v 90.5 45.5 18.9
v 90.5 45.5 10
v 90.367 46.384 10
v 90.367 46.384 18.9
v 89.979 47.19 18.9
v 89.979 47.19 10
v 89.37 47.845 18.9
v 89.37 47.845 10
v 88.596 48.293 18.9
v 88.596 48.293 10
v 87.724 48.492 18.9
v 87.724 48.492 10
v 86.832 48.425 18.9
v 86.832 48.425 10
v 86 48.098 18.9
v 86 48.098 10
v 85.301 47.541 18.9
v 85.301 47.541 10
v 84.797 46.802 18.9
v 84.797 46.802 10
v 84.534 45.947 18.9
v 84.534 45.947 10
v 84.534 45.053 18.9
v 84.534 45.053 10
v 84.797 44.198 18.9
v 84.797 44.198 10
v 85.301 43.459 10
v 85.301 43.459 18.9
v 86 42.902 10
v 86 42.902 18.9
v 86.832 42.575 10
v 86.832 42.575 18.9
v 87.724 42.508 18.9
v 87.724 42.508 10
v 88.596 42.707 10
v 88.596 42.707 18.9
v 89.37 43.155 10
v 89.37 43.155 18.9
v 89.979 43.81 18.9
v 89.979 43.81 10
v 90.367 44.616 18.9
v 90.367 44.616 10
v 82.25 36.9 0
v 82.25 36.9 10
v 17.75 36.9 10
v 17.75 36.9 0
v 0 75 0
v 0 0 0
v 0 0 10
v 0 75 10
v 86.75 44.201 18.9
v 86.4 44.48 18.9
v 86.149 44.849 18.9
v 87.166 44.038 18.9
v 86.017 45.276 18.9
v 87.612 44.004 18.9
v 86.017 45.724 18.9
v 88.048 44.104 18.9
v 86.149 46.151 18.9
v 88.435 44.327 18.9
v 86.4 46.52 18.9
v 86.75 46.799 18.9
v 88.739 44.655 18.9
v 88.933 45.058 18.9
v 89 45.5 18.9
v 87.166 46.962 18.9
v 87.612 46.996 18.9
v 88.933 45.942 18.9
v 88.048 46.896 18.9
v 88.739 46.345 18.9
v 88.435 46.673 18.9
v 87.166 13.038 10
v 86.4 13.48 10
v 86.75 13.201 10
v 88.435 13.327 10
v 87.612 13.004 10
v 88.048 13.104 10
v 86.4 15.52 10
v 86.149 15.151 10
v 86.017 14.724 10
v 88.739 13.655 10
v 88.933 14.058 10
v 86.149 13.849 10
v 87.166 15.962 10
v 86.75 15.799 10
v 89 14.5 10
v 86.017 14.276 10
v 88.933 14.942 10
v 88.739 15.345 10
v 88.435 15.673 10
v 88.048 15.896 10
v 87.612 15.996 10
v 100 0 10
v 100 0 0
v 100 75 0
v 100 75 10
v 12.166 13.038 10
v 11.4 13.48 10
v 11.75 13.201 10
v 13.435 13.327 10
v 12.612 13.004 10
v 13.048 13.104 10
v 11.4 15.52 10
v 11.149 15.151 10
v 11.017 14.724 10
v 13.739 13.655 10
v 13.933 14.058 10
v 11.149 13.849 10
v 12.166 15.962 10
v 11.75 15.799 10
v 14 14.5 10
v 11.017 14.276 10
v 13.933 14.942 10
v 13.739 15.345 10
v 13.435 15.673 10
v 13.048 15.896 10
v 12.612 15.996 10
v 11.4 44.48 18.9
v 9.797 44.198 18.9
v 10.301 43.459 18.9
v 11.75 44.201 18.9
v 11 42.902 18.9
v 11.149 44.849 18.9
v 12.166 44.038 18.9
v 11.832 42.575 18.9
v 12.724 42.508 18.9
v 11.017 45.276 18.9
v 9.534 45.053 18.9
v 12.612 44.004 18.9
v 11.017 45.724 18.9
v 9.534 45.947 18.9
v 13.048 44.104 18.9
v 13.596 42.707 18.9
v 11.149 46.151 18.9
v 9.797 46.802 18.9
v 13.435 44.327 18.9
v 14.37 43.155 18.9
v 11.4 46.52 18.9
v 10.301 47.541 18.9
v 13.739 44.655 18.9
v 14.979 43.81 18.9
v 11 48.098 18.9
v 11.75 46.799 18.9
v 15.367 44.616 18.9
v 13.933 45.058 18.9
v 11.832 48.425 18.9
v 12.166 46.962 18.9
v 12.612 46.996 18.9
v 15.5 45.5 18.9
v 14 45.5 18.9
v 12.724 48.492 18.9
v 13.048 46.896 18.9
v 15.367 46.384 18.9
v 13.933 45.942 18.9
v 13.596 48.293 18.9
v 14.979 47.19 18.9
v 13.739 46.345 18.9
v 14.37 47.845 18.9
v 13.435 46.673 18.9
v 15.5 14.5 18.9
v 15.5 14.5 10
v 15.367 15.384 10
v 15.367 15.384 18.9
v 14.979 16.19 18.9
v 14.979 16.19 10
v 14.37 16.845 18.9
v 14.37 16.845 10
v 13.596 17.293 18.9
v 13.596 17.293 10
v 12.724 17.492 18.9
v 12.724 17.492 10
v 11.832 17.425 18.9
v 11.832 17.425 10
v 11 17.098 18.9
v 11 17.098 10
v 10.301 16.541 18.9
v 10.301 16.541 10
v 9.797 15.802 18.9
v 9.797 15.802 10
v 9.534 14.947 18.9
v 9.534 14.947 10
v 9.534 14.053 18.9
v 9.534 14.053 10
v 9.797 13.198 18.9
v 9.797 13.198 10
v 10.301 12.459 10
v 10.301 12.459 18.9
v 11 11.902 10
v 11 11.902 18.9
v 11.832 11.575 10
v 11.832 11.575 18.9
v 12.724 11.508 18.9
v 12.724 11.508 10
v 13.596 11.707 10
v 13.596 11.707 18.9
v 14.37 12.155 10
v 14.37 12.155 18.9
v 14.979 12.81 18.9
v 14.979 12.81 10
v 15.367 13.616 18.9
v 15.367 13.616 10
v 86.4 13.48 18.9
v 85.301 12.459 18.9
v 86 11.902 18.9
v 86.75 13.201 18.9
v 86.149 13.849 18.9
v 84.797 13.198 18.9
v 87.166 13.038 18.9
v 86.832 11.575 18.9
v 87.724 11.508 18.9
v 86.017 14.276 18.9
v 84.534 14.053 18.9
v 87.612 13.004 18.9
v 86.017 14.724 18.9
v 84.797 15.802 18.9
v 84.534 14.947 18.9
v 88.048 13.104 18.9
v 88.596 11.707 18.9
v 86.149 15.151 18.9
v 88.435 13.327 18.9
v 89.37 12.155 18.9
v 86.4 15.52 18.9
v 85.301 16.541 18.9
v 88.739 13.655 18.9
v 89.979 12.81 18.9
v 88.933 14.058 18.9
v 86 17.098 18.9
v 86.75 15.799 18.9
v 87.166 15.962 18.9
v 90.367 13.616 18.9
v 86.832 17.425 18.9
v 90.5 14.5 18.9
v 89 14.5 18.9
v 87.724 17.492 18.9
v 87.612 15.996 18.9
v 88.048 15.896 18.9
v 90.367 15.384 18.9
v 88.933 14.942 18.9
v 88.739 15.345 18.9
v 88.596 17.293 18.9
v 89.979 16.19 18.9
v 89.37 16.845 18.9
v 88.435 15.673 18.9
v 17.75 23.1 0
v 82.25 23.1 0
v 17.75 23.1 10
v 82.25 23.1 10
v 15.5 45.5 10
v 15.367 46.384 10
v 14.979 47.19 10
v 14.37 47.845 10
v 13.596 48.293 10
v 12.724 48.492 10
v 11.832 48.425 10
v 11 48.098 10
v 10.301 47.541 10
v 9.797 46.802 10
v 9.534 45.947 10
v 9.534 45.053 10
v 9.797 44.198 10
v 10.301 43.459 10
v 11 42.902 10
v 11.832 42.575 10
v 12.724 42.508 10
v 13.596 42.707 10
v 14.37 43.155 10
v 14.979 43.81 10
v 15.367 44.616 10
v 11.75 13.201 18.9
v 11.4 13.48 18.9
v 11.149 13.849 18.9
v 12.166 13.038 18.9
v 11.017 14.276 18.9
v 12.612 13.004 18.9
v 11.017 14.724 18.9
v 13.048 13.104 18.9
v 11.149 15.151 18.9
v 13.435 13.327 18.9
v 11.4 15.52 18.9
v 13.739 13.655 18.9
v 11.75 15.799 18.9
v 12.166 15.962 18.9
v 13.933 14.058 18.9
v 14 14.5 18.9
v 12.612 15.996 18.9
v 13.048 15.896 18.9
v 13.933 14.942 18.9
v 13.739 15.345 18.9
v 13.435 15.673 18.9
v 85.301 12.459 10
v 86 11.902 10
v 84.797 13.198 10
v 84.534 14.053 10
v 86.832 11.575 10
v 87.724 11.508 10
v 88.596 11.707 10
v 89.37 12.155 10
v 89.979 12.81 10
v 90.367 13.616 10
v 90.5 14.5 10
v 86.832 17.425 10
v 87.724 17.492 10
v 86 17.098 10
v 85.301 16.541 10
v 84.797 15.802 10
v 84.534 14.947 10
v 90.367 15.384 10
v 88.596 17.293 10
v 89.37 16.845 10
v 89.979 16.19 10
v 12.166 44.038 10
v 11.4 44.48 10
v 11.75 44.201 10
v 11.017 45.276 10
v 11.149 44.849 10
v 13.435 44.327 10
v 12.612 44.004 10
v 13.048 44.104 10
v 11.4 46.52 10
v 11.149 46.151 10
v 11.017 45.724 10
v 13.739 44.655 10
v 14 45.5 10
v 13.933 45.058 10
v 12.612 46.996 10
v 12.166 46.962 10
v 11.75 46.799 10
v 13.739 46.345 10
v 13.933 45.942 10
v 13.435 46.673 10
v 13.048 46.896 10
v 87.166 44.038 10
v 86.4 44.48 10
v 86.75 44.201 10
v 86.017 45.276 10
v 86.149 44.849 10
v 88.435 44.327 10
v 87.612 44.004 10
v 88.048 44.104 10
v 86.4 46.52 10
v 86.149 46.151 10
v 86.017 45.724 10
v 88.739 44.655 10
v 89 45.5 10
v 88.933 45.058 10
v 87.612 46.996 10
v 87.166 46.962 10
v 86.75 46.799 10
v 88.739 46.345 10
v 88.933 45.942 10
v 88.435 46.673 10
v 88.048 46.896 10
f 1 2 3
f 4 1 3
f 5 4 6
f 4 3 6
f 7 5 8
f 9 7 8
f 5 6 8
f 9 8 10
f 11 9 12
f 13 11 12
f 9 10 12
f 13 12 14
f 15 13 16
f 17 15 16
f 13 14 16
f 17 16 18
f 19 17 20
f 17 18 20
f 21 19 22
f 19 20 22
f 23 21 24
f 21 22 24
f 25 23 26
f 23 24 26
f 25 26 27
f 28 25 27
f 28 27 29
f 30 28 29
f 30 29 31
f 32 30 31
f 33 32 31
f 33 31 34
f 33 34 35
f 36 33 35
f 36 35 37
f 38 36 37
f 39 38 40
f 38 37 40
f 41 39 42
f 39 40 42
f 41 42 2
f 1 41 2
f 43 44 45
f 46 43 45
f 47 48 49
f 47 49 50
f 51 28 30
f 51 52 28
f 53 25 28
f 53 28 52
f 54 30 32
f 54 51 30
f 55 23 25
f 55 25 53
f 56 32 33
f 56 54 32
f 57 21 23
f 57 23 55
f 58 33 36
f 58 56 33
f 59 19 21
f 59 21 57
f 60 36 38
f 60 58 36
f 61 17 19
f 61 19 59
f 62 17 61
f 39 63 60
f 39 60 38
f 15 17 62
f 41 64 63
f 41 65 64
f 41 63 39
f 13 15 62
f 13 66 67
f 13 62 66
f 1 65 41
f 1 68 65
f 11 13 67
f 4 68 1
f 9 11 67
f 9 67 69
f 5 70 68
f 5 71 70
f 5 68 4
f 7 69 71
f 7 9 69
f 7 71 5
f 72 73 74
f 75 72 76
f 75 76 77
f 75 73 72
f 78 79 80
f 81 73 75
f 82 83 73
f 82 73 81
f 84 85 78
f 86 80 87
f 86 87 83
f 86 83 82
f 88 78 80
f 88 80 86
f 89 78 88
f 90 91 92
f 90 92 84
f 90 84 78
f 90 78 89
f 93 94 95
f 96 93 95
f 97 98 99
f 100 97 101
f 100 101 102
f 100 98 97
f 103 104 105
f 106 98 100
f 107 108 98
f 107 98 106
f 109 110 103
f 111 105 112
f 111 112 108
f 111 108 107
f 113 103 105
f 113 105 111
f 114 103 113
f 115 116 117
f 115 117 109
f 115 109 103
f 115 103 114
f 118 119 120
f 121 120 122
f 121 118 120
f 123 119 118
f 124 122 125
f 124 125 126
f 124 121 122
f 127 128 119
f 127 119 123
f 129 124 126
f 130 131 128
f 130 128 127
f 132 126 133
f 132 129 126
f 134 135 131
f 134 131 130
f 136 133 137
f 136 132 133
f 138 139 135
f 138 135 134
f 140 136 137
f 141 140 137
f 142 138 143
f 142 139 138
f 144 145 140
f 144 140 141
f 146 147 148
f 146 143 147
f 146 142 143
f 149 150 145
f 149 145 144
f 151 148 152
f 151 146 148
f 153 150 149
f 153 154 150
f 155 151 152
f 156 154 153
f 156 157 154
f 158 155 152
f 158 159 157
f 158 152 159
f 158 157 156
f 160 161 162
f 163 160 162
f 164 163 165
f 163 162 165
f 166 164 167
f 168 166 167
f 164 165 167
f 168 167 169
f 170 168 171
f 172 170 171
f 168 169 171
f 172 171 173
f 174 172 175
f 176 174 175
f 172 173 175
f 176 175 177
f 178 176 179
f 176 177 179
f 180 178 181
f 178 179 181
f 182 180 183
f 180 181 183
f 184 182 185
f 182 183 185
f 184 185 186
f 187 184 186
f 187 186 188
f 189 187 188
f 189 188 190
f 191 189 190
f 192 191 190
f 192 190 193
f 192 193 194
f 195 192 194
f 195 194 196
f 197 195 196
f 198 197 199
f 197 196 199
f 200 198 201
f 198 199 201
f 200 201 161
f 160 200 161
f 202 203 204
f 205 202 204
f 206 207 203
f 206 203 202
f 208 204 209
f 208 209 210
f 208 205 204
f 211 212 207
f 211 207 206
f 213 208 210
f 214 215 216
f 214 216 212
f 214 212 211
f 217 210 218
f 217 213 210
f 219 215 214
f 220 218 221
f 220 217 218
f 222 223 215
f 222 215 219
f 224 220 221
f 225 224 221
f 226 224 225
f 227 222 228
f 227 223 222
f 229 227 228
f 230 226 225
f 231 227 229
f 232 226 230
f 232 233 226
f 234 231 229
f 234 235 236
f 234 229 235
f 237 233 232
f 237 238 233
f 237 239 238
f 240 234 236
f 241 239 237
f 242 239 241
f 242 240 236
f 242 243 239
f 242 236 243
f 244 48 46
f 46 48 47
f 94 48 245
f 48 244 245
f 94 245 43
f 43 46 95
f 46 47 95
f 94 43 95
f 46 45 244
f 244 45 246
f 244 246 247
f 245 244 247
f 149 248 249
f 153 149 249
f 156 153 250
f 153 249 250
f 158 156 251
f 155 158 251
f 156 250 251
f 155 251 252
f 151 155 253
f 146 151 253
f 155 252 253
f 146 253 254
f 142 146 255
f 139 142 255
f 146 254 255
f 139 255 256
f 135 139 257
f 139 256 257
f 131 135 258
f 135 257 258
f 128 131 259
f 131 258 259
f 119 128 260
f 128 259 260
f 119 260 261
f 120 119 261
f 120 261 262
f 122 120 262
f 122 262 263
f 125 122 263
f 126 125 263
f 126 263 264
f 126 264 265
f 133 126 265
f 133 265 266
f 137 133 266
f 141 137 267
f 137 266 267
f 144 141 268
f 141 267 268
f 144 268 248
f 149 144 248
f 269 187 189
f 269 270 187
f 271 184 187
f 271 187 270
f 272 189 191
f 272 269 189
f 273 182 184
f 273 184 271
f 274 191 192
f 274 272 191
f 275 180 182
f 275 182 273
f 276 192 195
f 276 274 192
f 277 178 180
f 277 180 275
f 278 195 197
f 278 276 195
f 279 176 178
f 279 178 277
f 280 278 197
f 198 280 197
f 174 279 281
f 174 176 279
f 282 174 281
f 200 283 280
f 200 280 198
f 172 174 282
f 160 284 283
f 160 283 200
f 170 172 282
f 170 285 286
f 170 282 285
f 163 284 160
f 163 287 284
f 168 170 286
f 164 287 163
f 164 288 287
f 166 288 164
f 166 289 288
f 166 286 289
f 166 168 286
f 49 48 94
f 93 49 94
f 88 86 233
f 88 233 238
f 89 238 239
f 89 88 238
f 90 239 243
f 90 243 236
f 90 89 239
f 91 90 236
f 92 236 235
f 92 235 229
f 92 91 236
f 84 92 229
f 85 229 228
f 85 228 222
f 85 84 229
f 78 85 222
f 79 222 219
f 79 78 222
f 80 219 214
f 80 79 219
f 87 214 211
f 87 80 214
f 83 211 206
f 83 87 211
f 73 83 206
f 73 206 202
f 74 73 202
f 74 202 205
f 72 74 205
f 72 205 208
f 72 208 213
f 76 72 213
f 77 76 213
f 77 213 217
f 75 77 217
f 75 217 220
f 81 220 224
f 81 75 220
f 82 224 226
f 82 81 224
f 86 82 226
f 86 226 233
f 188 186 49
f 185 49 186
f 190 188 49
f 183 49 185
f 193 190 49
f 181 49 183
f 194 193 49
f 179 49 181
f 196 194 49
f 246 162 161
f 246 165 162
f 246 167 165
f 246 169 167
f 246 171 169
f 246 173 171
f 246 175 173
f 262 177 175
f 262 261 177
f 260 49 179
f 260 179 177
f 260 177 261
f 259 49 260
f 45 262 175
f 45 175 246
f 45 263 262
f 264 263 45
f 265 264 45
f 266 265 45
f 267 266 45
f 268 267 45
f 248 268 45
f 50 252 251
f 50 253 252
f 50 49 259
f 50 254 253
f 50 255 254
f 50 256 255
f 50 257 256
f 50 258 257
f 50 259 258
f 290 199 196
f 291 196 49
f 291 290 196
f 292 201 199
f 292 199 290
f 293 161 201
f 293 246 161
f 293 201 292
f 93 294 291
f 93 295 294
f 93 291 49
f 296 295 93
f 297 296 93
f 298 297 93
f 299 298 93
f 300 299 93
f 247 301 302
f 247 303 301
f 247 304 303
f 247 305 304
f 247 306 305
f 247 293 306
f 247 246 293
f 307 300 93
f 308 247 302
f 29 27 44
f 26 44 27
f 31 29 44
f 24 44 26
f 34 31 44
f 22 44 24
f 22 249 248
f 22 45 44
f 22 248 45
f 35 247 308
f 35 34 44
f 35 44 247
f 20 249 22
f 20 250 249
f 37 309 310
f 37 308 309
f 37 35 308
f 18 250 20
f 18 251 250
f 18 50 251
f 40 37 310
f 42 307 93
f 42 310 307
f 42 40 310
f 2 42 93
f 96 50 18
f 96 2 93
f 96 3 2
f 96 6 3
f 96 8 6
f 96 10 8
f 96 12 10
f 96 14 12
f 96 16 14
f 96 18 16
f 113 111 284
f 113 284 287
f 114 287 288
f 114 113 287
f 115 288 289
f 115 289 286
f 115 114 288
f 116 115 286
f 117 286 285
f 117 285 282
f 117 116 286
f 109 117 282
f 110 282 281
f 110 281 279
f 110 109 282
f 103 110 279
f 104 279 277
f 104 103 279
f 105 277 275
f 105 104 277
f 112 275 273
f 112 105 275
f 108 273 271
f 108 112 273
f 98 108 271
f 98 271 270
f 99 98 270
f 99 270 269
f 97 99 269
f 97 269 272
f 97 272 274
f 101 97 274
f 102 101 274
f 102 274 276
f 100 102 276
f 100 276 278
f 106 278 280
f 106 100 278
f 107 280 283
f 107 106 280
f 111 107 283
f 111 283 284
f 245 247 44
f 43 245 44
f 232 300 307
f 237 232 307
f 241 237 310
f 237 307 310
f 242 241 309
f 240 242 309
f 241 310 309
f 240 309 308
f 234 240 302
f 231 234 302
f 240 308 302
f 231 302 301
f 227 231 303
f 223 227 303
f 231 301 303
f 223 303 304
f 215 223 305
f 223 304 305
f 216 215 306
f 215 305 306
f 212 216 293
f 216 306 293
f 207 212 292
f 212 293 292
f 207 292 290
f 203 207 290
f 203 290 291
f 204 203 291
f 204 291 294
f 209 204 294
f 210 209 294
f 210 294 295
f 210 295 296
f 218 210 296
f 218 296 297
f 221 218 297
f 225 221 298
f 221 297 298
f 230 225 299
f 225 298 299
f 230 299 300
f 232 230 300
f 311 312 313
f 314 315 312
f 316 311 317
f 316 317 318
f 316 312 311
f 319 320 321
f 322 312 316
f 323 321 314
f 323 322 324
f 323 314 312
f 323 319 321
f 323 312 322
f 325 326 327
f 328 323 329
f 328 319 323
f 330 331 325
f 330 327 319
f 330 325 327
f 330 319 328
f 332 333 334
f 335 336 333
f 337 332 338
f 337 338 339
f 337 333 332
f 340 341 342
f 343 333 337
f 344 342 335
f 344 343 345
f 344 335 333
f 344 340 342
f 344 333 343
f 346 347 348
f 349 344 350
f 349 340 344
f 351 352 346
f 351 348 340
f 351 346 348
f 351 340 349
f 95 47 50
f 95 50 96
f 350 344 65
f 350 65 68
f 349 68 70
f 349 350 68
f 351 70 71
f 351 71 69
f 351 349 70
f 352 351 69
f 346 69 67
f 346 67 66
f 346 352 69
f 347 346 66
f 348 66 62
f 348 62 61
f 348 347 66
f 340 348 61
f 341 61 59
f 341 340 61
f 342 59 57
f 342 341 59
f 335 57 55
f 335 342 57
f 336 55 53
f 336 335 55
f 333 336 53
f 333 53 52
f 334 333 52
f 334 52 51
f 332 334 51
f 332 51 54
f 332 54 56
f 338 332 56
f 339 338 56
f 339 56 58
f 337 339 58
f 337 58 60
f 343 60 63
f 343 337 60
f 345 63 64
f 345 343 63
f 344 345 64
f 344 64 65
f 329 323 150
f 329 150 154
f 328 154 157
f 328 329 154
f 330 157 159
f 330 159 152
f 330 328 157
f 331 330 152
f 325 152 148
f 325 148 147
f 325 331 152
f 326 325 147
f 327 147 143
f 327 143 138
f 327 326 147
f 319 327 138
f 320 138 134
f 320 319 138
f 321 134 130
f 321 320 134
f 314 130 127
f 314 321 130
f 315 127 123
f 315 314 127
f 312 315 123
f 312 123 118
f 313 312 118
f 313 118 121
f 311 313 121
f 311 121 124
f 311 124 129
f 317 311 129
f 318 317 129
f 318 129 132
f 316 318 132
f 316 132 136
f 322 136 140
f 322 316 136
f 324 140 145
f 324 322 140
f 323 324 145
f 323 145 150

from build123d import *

# Parameters (mm, degrees)
SKETCH_W      = 100
SKETCH_H      = 75
PAD_DEPTH     = 10
SKETCH001_R   = 3
SKETCH001_R_2 = 1.5
PAD001_DEPTH  = 8.9
POCKET_DEPTH  = 10


with BuildPart() as part:
    # Sketch → Pad (new body)
    with BuildSketch(Plane.XY):
        with Locations((50, 37.5)):
            Rectangle(SKETCH_W, SKETCH_H)
    extrude(amount=PAD_DEPTH)

    # Sketch001 → Pad001 (new body)
    with BuildSketch(Plane.XY.offset(10)):
        with Locations((12.5, 14.5)):
            Circle(SKETCH001_R)
        with Locations((12.5, 14.5)):
            Circle(SKETCH001_R_2, mode=Mode.SUBTRACT)
        with Locations((12.5, 45.5)):
            Circle(SKETCH001_R)
        with Locations((12.5, 45.5)):
            Circle(SKETCH001_R_2, mode=Mode.SUBTRACT)
        with Locations((87.5, 45.5)):
            Circle(SKETCH001_R)
        with Locations((87.5, 45.5)):
            Circle(SKETCH001_R_2, mode=Mode.SUBTRACT)
        with Locations((87.5, 14.5)):
            Circle(SKETCH001_R)
        with Locations((87.5, 14.5)):
            Circle(SKETCH001_R_2, mode=Mode.SUBTRACT)
    extrude(amount=PAD001_DEPTH)

    # Sketch002 → Pocket (cut)
    with BuildSketch(Plane.XY.offset(10)):
        Polygon((82.25, 23.1), (82.25, 36.9), (17.75, 36.9), (17.75, 30), (17.75, 23.1), (50, 23.1), align=None)
    extrude(amount=-POCKET_DEPTH, mode=Mode.SUBTRACT)


solid = part.part
